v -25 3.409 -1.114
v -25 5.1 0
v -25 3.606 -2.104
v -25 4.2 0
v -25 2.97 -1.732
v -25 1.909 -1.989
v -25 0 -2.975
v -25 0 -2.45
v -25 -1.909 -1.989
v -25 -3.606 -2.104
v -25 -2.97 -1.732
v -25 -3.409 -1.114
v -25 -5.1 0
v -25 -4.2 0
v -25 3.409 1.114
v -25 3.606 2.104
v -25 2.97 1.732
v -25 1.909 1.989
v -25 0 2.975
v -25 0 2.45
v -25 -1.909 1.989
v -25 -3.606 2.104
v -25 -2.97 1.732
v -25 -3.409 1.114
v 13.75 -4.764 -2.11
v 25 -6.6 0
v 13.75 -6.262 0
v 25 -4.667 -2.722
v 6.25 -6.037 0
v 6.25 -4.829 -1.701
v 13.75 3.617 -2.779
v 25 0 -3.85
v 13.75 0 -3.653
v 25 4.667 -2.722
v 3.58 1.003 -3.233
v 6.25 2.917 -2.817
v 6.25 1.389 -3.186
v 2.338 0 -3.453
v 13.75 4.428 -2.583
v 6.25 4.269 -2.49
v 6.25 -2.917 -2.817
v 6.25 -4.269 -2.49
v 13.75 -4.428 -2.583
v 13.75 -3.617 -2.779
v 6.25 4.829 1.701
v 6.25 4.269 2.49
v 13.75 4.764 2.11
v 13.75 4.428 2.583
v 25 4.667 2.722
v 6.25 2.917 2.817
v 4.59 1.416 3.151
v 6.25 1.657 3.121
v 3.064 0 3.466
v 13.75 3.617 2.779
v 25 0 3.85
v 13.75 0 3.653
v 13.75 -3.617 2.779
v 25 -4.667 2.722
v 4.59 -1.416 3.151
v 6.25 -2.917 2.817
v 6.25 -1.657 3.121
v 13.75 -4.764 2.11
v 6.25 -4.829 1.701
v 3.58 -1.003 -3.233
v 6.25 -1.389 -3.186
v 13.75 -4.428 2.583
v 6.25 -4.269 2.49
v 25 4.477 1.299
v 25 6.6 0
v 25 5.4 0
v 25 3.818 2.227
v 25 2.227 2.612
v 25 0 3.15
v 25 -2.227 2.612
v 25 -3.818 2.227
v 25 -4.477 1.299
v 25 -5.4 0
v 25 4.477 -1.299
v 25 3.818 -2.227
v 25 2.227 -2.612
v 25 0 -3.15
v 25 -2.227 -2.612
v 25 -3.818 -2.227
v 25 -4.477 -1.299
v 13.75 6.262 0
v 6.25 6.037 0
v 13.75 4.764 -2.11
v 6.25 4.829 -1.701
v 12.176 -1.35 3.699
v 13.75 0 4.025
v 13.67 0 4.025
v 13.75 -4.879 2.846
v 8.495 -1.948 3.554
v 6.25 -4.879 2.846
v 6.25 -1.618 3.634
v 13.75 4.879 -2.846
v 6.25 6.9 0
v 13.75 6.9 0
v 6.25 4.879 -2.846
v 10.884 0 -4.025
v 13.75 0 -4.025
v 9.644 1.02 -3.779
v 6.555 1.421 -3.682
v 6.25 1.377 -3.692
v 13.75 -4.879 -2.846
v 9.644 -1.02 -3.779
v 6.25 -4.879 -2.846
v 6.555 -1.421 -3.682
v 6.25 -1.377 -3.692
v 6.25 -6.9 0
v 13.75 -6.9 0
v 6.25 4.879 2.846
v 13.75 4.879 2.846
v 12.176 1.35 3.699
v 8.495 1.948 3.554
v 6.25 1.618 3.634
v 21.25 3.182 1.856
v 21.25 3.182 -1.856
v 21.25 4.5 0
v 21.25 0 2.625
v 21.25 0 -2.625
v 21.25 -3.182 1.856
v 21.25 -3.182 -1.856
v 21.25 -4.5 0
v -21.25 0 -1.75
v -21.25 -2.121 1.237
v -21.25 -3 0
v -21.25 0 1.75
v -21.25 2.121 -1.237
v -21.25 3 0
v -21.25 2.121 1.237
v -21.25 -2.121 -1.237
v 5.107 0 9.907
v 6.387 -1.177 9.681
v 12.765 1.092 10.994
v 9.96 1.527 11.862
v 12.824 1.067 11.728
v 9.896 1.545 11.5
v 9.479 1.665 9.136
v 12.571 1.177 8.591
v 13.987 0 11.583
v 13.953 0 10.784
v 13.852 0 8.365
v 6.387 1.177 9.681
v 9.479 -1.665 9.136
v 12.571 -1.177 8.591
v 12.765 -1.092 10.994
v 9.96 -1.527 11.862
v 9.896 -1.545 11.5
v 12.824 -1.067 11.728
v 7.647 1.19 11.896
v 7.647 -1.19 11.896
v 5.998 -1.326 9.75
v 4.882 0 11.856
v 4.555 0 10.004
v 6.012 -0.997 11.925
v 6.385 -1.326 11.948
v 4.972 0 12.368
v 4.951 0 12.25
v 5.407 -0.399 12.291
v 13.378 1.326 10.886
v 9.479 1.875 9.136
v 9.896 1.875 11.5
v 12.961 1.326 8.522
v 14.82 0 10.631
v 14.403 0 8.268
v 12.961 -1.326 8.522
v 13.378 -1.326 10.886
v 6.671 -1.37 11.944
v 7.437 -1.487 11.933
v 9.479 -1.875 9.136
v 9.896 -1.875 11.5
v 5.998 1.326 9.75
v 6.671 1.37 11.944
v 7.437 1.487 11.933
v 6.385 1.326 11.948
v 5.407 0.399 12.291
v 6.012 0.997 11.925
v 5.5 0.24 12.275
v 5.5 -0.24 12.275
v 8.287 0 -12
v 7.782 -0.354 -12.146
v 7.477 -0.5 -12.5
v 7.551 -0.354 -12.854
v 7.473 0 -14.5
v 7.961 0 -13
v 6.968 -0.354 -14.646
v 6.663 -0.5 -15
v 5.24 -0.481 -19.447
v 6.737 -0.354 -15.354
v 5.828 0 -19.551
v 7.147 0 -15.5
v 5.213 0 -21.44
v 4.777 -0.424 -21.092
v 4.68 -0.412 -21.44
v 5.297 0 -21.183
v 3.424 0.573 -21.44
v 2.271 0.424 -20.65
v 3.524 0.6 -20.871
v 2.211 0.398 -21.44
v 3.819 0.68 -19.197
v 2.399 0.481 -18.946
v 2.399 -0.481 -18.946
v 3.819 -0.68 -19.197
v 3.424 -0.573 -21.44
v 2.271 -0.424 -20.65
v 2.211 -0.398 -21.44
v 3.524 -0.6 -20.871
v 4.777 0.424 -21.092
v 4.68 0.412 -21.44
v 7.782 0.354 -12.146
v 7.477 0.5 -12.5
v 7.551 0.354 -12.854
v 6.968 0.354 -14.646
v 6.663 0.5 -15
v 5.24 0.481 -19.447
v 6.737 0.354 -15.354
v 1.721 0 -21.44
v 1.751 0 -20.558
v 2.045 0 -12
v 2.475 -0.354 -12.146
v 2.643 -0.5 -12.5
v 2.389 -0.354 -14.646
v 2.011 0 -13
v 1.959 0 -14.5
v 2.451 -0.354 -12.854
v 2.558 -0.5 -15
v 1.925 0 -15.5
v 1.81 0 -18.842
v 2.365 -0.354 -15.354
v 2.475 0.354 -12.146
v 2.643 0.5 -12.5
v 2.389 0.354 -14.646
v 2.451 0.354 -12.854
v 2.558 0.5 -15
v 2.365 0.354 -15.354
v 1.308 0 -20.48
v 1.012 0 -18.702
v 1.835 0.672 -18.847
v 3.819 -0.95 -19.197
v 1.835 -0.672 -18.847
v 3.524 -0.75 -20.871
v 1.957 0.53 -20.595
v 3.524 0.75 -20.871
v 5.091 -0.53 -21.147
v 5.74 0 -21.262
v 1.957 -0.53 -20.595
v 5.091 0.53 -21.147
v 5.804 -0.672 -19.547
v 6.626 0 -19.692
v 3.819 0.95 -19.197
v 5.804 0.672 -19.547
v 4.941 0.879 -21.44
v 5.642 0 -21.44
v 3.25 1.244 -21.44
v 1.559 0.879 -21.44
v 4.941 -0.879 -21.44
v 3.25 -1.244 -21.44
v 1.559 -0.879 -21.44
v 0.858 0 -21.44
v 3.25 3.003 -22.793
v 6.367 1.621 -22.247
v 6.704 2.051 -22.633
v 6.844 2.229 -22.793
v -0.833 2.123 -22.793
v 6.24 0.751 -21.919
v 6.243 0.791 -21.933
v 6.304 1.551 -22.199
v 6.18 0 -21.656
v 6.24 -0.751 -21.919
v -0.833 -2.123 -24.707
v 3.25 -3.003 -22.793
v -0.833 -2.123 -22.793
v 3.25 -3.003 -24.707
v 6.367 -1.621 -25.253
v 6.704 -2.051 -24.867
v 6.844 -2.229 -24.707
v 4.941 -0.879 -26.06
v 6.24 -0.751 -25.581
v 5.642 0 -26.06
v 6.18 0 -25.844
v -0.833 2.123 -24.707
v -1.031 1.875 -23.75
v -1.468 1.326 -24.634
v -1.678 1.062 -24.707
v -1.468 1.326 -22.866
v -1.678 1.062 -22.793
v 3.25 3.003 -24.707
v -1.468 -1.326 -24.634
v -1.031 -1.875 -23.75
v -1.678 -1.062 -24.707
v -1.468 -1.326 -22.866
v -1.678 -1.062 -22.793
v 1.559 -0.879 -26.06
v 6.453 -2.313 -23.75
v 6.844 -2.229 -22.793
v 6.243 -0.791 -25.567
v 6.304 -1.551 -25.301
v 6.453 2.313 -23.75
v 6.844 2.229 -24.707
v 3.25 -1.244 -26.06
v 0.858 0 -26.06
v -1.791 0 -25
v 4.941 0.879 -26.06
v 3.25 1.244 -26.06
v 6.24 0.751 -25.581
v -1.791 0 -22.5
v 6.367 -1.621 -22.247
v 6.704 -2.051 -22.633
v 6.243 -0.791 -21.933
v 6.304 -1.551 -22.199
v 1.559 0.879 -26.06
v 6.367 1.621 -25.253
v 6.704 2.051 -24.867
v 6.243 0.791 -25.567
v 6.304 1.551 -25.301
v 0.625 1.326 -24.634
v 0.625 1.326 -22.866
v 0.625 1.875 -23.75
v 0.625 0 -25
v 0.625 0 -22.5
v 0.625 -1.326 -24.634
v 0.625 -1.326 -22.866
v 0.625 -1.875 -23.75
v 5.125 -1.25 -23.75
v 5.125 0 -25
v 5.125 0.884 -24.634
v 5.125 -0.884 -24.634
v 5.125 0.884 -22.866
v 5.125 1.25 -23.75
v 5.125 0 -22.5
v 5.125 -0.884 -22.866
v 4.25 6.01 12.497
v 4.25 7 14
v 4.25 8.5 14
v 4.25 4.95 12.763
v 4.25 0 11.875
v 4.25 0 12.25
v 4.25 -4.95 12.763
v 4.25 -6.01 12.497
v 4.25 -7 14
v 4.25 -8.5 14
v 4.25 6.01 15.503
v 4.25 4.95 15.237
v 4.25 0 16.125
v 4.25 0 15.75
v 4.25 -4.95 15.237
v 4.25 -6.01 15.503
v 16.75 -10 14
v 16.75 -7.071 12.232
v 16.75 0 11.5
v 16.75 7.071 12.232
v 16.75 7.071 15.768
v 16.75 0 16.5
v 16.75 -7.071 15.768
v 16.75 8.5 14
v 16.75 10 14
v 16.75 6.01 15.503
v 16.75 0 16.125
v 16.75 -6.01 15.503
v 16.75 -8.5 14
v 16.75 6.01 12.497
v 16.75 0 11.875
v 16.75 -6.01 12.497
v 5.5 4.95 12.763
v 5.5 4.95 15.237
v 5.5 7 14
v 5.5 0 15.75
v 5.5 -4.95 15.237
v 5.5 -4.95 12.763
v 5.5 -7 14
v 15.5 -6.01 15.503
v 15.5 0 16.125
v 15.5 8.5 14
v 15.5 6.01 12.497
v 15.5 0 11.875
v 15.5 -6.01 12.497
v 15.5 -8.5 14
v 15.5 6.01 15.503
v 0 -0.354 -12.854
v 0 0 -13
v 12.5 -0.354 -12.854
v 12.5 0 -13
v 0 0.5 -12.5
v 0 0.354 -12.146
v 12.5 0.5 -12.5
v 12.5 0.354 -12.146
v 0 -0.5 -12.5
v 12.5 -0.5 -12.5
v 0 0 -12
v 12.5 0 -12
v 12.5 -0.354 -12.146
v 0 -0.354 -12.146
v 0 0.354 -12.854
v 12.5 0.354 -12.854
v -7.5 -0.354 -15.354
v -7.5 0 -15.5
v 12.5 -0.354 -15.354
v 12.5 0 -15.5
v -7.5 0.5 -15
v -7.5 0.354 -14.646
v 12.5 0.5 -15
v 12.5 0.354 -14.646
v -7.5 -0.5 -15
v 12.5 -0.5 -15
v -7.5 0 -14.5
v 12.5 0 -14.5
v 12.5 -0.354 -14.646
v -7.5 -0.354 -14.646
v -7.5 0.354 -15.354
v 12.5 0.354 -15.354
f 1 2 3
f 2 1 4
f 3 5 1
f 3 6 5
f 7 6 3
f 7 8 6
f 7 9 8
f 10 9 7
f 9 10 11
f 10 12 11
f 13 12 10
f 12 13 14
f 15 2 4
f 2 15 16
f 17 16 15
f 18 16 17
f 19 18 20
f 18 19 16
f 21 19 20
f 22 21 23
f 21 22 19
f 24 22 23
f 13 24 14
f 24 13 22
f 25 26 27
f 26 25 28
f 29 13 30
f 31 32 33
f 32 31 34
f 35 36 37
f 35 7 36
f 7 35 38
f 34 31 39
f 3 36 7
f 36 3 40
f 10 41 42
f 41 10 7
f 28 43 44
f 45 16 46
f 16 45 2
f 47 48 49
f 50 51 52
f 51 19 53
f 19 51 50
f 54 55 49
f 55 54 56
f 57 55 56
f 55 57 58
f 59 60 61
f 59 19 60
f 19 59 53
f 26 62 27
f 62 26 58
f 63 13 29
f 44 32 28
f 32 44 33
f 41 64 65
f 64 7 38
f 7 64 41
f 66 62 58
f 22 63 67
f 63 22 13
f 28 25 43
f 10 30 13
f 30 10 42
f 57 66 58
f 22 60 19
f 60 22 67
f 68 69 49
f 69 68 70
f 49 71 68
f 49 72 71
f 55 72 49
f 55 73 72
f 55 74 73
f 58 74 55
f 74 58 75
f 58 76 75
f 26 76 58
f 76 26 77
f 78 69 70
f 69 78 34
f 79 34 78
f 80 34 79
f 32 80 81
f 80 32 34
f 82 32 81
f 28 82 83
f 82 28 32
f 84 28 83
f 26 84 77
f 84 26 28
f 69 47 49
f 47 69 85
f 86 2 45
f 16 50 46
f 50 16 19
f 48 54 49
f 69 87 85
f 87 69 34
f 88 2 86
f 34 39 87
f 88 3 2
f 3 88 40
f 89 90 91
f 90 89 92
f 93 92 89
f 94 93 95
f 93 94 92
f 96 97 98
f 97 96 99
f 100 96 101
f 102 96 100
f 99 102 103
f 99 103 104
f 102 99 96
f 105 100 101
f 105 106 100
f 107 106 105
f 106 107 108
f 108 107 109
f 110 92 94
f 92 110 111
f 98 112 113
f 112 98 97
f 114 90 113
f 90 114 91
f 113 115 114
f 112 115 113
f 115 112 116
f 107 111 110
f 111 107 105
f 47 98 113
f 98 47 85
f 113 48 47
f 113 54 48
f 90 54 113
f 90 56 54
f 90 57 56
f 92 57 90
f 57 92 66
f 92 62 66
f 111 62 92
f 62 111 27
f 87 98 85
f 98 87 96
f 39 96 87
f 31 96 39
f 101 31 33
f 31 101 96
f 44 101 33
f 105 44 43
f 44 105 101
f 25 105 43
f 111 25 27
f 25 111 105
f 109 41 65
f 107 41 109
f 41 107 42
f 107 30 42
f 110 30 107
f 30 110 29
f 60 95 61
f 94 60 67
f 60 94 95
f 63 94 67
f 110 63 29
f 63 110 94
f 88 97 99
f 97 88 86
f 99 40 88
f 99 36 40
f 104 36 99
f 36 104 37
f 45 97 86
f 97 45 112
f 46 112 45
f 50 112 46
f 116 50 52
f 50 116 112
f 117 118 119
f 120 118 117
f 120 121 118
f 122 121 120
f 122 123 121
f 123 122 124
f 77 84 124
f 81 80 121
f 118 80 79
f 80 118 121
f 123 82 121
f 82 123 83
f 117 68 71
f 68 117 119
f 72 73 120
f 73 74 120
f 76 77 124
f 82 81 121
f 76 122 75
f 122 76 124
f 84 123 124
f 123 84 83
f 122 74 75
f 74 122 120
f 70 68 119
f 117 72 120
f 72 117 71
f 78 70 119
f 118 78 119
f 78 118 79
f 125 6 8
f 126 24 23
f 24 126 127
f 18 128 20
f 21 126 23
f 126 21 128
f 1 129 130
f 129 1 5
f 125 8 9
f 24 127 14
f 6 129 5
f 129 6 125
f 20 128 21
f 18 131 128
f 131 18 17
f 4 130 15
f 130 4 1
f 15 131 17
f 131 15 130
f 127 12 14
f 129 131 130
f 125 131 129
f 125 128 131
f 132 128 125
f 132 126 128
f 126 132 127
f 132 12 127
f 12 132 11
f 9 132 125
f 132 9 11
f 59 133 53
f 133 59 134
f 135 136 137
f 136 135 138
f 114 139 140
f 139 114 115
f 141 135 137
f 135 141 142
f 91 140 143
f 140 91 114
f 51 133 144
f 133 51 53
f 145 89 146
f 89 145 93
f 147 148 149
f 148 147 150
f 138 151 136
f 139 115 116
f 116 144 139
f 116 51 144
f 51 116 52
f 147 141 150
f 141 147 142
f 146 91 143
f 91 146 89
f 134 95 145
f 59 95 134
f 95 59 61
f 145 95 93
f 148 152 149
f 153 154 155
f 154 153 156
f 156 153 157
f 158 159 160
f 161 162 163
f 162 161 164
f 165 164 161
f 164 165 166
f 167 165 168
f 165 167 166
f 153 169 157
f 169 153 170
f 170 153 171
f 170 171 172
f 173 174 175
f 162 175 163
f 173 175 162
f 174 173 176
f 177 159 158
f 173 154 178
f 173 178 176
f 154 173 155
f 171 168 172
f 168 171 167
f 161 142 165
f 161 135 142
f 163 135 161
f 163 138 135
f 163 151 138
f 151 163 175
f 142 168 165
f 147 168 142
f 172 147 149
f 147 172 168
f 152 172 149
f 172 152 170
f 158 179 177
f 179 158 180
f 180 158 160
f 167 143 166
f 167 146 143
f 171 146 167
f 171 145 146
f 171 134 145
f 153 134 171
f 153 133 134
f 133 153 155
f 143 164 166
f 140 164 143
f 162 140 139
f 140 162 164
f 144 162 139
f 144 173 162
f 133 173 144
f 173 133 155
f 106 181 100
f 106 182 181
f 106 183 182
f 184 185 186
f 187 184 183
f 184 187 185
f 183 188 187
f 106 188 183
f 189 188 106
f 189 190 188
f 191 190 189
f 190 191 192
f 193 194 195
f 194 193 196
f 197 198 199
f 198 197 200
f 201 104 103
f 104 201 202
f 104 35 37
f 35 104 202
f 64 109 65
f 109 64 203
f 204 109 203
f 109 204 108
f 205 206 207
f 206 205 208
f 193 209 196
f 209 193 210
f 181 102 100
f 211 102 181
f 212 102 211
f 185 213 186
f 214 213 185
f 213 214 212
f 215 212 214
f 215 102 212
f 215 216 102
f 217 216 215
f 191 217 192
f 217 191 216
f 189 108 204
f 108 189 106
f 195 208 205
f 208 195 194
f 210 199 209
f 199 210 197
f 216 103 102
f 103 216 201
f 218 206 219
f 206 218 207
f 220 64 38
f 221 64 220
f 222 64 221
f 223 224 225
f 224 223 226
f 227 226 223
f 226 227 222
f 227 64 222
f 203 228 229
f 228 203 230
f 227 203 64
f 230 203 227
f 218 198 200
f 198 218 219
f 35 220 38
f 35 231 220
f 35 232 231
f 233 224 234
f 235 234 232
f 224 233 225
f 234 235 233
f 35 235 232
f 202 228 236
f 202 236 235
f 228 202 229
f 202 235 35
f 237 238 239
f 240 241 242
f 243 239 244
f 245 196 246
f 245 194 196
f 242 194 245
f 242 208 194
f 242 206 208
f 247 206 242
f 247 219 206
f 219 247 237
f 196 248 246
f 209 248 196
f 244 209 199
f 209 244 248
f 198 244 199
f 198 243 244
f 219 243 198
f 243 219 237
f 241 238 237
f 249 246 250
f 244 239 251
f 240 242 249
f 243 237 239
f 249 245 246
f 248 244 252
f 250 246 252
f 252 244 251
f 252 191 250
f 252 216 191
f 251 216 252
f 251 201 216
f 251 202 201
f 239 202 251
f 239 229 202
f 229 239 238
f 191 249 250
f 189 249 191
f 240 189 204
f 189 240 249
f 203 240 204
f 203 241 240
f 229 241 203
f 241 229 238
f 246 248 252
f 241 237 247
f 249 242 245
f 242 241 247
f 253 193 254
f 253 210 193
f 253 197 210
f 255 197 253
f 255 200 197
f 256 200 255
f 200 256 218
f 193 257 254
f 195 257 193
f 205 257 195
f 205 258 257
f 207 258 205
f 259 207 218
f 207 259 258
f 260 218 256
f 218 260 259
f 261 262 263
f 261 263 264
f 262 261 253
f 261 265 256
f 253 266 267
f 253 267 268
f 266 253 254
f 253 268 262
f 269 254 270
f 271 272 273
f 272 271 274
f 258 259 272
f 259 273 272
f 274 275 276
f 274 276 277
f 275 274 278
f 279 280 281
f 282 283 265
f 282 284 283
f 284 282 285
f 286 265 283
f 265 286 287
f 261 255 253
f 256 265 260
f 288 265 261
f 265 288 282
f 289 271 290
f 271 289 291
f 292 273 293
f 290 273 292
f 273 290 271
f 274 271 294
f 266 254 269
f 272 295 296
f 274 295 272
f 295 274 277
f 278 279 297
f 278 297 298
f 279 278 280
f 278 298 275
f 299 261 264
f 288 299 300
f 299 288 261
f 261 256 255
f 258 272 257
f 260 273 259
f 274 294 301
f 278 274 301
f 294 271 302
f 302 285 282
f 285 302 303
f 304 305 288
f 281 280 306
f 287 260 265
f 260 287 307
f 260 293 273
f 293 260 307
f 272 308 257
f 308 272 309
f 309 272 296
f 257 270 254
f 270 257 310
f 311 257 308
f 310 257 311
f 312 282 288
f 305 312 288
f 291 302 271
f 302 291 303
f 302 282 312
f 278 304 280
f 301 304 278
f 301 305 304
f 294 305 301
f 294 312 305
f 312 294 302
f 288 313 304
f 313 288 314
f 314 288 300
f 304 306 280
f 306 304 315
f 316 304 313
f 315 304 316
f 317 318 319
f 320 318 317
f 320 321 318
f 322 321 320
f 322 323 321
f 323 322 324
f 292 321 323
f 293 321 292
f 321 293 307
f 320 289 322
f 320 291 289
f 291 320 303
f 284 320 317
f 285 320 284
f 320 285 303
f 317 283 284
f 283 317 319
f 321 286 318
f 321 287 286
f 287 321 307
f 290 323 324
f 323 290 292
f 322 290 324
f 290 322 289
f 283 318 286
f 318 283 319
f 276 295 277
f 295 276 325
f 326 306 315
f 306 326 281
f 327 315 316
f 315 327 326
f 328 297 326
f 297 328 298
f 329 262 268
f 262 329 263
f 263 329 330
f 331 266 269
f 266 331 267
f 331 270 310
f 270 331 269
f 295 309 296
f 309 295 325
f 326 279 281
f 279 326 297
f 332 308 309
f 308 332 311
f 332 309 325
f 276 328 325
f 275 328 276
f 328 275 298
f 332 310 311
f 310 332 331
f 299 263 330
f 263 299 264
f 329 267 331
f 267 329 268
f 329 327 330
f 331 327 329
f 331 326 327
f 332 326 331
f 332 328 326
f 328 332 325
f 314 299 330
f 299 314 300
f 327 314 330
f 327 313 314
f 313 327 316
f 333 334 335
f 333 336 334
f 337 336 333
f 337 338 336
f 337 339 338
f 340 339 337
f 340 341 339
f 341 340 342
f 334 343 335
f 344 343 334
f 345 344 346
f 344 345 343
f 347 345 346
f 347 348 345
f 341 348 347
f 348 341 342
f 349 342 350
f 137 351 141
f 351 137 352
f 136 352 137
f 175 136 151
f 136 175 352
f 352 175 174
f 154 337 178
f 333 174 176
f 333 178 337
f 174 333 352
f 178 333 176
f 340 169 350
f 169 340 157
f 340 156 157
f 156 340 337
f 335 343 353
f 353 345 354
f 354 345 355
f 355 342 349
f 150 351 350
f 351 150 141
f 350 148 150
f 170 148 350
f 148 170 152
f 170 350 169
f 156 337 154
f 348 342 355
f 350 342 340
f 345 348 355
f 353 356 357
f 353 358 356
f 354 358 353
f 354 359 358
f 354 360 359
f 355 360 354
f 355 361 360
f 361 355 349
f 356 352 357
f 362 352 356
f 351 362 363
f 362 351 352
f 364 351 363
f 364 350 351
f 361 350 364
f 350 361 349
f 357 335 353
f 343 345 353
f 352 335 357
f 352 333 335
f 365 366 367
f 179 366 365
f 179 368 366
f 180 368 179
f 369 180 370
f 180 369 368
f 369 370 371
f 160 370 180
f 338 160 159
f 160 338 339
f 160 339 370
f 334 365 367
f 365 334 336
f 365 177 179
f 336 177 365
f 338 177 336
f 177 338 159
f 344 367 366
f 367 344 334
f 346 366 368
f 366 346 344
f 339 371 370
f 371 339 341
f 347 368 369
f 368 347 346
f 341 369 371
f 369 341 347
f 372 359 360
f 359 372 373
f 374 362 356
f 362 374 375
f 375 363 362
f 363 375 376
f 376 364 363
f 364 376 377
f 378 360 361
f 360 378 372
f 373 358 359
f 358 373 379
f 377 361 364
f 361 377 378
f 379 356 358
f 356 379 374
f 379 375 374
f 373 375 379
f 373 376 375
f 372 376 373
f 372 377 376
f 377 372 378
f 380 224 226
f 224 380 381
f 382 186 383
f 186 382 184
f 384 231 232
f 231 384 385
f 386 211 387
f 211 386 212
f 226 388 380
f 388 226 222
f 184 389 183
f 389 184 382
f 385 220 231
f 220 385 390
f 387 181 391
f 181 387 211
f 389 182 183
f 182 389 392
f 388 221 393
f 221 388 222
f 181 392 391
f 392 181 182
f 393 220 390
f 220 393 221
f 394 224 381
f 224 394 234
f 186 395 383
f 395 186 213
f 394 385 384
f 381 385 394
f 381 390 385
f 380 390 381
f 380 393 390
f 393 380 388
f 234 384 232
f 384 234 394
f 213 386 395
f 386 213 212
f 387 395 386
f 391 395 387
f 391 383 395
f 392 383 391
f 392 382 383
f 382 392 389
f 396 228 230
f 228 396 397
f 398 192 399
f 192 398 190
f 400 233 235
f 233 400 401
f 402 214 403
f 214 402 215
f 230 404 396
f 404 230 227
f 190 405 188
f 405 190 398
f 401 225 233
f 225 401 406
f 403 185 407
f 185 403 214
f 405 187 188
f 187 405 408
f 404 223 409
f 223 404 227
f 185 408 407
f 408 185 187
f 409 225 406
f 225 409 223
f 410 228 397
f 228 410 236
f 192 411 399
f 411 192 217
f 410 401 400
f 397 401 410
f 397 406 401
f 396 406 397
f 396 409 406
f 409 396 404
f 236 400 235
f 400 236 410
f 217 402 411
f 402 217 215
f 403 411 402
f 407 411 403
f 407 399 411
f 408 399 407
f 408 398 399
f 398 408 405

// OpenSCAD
$fn=8;

module main_body()
{
	scale(v = [1, 1.2, 0.7])
	rotate(a = 90, v = [0, 1, 0])  {
		difference() {
			union() {
				cylinder(h = 20, r1 = 1.7, r2 = 2.2, center = true);
				translate(v = [0, 0, 4])
					cylinder(h = 3, r1 = 2.3, r2 = 2.3, center = true);
			}
		translate(v = [0, 0, 10])
			cylinder(h = 3, r1 = 1.5, r2 = 2.1, center = true);
		translate(v = [0, 0, -10])
			cylinder(h = 3, r1 = 1.8, r2 = 1.0, center = true);
		}
	}
}

module top_tower()
{
	scale(v = [0.8, 0.3, 1.2]) {
		cylinder(h = 5, r1 = 3, r2 = 2, center = true);
		translate(v = [0, 0, 1.8])
			cylinder(h = 0.8, r1 = 2.5, r2 = 2.5, center = true);
	}
}

module bottom_tower()
{
	scale(v = [0.6, 0.2, 1.7]) {
		cylinder(h = 5, r1 = 3, r2 = 1, center = true);
		translate(v = [0, 0, 1.8])
			cylinder(h = 0.4, r1 = 1.9, r2 = 1.5, center = true);
	}
}

module bottom_pod()
{
	translate(v = [1.3, 0, -9.5]) {
		difference() {
		scale(v = [2.5, 1.3, 1])
			sphere(r = 1.0);
		scale(v = [1, 1.5, 1])
		translate(v = [-2.3, 0, 0])
			rotate(a = 90, v = [0, 1, 0])
				cylinder(h = 2.5, r1 = 0.5, r2 = 0.5, center = true);
		translate(v = [2.0, 0, 0])
			rotate(a = 90, v = [0, 1, 0])
				cylinder(h = 2.5, r1 = 0.5, r2 = 2.5, center = true);
		}
	}
}

module top_pod()
{
	translate(v = [4.2, 0, 5.6])
	rotate(a = 90, v = [0, 1, 0])
	scale(v = [0.5, 2, 1]) {
		difference() {
			cylinder(h = 5, r1 = 1.7, r2 = 2, center = true);
			translate(v = [0, 0, -3])
				cylinder(h = 2, r1 = 1.4, r2 = 1.4, center = true);
			translate(v = [0, 0, 3])
				cylinder(h = 2, r1 = 1.7, r2 = 1.7, center = true);
		}
	}
}

module antenna()
{
	translate(v = [0, 0, -5])
		rotate(a = 90, v = [0, 1, 0])
			cylinder(h = 5, r1 = 0.2, r2 = 0.2, cetner = true);
	translate(v = [-3, 0, -6])
		rotate(a = 90, v = [0, 1, 0])
			cylinder(h = 8, r1 = 0.2, r2 = 0.2, cetner = true);
}


scale(v = [2.5, 2.5, 2.5])
union() {
	main_body();
	translate(v = [3.5, 0, 2])
		rotate(a = 10, v = [0, 1, 0])
			top_tower();
	translate(v = [2.0, 0, -5])
		rotate(a = 190, v = [0, 1, 0])
			bottom_tower();
	bottom_pod();
	top_pod();
	antenna();
}
